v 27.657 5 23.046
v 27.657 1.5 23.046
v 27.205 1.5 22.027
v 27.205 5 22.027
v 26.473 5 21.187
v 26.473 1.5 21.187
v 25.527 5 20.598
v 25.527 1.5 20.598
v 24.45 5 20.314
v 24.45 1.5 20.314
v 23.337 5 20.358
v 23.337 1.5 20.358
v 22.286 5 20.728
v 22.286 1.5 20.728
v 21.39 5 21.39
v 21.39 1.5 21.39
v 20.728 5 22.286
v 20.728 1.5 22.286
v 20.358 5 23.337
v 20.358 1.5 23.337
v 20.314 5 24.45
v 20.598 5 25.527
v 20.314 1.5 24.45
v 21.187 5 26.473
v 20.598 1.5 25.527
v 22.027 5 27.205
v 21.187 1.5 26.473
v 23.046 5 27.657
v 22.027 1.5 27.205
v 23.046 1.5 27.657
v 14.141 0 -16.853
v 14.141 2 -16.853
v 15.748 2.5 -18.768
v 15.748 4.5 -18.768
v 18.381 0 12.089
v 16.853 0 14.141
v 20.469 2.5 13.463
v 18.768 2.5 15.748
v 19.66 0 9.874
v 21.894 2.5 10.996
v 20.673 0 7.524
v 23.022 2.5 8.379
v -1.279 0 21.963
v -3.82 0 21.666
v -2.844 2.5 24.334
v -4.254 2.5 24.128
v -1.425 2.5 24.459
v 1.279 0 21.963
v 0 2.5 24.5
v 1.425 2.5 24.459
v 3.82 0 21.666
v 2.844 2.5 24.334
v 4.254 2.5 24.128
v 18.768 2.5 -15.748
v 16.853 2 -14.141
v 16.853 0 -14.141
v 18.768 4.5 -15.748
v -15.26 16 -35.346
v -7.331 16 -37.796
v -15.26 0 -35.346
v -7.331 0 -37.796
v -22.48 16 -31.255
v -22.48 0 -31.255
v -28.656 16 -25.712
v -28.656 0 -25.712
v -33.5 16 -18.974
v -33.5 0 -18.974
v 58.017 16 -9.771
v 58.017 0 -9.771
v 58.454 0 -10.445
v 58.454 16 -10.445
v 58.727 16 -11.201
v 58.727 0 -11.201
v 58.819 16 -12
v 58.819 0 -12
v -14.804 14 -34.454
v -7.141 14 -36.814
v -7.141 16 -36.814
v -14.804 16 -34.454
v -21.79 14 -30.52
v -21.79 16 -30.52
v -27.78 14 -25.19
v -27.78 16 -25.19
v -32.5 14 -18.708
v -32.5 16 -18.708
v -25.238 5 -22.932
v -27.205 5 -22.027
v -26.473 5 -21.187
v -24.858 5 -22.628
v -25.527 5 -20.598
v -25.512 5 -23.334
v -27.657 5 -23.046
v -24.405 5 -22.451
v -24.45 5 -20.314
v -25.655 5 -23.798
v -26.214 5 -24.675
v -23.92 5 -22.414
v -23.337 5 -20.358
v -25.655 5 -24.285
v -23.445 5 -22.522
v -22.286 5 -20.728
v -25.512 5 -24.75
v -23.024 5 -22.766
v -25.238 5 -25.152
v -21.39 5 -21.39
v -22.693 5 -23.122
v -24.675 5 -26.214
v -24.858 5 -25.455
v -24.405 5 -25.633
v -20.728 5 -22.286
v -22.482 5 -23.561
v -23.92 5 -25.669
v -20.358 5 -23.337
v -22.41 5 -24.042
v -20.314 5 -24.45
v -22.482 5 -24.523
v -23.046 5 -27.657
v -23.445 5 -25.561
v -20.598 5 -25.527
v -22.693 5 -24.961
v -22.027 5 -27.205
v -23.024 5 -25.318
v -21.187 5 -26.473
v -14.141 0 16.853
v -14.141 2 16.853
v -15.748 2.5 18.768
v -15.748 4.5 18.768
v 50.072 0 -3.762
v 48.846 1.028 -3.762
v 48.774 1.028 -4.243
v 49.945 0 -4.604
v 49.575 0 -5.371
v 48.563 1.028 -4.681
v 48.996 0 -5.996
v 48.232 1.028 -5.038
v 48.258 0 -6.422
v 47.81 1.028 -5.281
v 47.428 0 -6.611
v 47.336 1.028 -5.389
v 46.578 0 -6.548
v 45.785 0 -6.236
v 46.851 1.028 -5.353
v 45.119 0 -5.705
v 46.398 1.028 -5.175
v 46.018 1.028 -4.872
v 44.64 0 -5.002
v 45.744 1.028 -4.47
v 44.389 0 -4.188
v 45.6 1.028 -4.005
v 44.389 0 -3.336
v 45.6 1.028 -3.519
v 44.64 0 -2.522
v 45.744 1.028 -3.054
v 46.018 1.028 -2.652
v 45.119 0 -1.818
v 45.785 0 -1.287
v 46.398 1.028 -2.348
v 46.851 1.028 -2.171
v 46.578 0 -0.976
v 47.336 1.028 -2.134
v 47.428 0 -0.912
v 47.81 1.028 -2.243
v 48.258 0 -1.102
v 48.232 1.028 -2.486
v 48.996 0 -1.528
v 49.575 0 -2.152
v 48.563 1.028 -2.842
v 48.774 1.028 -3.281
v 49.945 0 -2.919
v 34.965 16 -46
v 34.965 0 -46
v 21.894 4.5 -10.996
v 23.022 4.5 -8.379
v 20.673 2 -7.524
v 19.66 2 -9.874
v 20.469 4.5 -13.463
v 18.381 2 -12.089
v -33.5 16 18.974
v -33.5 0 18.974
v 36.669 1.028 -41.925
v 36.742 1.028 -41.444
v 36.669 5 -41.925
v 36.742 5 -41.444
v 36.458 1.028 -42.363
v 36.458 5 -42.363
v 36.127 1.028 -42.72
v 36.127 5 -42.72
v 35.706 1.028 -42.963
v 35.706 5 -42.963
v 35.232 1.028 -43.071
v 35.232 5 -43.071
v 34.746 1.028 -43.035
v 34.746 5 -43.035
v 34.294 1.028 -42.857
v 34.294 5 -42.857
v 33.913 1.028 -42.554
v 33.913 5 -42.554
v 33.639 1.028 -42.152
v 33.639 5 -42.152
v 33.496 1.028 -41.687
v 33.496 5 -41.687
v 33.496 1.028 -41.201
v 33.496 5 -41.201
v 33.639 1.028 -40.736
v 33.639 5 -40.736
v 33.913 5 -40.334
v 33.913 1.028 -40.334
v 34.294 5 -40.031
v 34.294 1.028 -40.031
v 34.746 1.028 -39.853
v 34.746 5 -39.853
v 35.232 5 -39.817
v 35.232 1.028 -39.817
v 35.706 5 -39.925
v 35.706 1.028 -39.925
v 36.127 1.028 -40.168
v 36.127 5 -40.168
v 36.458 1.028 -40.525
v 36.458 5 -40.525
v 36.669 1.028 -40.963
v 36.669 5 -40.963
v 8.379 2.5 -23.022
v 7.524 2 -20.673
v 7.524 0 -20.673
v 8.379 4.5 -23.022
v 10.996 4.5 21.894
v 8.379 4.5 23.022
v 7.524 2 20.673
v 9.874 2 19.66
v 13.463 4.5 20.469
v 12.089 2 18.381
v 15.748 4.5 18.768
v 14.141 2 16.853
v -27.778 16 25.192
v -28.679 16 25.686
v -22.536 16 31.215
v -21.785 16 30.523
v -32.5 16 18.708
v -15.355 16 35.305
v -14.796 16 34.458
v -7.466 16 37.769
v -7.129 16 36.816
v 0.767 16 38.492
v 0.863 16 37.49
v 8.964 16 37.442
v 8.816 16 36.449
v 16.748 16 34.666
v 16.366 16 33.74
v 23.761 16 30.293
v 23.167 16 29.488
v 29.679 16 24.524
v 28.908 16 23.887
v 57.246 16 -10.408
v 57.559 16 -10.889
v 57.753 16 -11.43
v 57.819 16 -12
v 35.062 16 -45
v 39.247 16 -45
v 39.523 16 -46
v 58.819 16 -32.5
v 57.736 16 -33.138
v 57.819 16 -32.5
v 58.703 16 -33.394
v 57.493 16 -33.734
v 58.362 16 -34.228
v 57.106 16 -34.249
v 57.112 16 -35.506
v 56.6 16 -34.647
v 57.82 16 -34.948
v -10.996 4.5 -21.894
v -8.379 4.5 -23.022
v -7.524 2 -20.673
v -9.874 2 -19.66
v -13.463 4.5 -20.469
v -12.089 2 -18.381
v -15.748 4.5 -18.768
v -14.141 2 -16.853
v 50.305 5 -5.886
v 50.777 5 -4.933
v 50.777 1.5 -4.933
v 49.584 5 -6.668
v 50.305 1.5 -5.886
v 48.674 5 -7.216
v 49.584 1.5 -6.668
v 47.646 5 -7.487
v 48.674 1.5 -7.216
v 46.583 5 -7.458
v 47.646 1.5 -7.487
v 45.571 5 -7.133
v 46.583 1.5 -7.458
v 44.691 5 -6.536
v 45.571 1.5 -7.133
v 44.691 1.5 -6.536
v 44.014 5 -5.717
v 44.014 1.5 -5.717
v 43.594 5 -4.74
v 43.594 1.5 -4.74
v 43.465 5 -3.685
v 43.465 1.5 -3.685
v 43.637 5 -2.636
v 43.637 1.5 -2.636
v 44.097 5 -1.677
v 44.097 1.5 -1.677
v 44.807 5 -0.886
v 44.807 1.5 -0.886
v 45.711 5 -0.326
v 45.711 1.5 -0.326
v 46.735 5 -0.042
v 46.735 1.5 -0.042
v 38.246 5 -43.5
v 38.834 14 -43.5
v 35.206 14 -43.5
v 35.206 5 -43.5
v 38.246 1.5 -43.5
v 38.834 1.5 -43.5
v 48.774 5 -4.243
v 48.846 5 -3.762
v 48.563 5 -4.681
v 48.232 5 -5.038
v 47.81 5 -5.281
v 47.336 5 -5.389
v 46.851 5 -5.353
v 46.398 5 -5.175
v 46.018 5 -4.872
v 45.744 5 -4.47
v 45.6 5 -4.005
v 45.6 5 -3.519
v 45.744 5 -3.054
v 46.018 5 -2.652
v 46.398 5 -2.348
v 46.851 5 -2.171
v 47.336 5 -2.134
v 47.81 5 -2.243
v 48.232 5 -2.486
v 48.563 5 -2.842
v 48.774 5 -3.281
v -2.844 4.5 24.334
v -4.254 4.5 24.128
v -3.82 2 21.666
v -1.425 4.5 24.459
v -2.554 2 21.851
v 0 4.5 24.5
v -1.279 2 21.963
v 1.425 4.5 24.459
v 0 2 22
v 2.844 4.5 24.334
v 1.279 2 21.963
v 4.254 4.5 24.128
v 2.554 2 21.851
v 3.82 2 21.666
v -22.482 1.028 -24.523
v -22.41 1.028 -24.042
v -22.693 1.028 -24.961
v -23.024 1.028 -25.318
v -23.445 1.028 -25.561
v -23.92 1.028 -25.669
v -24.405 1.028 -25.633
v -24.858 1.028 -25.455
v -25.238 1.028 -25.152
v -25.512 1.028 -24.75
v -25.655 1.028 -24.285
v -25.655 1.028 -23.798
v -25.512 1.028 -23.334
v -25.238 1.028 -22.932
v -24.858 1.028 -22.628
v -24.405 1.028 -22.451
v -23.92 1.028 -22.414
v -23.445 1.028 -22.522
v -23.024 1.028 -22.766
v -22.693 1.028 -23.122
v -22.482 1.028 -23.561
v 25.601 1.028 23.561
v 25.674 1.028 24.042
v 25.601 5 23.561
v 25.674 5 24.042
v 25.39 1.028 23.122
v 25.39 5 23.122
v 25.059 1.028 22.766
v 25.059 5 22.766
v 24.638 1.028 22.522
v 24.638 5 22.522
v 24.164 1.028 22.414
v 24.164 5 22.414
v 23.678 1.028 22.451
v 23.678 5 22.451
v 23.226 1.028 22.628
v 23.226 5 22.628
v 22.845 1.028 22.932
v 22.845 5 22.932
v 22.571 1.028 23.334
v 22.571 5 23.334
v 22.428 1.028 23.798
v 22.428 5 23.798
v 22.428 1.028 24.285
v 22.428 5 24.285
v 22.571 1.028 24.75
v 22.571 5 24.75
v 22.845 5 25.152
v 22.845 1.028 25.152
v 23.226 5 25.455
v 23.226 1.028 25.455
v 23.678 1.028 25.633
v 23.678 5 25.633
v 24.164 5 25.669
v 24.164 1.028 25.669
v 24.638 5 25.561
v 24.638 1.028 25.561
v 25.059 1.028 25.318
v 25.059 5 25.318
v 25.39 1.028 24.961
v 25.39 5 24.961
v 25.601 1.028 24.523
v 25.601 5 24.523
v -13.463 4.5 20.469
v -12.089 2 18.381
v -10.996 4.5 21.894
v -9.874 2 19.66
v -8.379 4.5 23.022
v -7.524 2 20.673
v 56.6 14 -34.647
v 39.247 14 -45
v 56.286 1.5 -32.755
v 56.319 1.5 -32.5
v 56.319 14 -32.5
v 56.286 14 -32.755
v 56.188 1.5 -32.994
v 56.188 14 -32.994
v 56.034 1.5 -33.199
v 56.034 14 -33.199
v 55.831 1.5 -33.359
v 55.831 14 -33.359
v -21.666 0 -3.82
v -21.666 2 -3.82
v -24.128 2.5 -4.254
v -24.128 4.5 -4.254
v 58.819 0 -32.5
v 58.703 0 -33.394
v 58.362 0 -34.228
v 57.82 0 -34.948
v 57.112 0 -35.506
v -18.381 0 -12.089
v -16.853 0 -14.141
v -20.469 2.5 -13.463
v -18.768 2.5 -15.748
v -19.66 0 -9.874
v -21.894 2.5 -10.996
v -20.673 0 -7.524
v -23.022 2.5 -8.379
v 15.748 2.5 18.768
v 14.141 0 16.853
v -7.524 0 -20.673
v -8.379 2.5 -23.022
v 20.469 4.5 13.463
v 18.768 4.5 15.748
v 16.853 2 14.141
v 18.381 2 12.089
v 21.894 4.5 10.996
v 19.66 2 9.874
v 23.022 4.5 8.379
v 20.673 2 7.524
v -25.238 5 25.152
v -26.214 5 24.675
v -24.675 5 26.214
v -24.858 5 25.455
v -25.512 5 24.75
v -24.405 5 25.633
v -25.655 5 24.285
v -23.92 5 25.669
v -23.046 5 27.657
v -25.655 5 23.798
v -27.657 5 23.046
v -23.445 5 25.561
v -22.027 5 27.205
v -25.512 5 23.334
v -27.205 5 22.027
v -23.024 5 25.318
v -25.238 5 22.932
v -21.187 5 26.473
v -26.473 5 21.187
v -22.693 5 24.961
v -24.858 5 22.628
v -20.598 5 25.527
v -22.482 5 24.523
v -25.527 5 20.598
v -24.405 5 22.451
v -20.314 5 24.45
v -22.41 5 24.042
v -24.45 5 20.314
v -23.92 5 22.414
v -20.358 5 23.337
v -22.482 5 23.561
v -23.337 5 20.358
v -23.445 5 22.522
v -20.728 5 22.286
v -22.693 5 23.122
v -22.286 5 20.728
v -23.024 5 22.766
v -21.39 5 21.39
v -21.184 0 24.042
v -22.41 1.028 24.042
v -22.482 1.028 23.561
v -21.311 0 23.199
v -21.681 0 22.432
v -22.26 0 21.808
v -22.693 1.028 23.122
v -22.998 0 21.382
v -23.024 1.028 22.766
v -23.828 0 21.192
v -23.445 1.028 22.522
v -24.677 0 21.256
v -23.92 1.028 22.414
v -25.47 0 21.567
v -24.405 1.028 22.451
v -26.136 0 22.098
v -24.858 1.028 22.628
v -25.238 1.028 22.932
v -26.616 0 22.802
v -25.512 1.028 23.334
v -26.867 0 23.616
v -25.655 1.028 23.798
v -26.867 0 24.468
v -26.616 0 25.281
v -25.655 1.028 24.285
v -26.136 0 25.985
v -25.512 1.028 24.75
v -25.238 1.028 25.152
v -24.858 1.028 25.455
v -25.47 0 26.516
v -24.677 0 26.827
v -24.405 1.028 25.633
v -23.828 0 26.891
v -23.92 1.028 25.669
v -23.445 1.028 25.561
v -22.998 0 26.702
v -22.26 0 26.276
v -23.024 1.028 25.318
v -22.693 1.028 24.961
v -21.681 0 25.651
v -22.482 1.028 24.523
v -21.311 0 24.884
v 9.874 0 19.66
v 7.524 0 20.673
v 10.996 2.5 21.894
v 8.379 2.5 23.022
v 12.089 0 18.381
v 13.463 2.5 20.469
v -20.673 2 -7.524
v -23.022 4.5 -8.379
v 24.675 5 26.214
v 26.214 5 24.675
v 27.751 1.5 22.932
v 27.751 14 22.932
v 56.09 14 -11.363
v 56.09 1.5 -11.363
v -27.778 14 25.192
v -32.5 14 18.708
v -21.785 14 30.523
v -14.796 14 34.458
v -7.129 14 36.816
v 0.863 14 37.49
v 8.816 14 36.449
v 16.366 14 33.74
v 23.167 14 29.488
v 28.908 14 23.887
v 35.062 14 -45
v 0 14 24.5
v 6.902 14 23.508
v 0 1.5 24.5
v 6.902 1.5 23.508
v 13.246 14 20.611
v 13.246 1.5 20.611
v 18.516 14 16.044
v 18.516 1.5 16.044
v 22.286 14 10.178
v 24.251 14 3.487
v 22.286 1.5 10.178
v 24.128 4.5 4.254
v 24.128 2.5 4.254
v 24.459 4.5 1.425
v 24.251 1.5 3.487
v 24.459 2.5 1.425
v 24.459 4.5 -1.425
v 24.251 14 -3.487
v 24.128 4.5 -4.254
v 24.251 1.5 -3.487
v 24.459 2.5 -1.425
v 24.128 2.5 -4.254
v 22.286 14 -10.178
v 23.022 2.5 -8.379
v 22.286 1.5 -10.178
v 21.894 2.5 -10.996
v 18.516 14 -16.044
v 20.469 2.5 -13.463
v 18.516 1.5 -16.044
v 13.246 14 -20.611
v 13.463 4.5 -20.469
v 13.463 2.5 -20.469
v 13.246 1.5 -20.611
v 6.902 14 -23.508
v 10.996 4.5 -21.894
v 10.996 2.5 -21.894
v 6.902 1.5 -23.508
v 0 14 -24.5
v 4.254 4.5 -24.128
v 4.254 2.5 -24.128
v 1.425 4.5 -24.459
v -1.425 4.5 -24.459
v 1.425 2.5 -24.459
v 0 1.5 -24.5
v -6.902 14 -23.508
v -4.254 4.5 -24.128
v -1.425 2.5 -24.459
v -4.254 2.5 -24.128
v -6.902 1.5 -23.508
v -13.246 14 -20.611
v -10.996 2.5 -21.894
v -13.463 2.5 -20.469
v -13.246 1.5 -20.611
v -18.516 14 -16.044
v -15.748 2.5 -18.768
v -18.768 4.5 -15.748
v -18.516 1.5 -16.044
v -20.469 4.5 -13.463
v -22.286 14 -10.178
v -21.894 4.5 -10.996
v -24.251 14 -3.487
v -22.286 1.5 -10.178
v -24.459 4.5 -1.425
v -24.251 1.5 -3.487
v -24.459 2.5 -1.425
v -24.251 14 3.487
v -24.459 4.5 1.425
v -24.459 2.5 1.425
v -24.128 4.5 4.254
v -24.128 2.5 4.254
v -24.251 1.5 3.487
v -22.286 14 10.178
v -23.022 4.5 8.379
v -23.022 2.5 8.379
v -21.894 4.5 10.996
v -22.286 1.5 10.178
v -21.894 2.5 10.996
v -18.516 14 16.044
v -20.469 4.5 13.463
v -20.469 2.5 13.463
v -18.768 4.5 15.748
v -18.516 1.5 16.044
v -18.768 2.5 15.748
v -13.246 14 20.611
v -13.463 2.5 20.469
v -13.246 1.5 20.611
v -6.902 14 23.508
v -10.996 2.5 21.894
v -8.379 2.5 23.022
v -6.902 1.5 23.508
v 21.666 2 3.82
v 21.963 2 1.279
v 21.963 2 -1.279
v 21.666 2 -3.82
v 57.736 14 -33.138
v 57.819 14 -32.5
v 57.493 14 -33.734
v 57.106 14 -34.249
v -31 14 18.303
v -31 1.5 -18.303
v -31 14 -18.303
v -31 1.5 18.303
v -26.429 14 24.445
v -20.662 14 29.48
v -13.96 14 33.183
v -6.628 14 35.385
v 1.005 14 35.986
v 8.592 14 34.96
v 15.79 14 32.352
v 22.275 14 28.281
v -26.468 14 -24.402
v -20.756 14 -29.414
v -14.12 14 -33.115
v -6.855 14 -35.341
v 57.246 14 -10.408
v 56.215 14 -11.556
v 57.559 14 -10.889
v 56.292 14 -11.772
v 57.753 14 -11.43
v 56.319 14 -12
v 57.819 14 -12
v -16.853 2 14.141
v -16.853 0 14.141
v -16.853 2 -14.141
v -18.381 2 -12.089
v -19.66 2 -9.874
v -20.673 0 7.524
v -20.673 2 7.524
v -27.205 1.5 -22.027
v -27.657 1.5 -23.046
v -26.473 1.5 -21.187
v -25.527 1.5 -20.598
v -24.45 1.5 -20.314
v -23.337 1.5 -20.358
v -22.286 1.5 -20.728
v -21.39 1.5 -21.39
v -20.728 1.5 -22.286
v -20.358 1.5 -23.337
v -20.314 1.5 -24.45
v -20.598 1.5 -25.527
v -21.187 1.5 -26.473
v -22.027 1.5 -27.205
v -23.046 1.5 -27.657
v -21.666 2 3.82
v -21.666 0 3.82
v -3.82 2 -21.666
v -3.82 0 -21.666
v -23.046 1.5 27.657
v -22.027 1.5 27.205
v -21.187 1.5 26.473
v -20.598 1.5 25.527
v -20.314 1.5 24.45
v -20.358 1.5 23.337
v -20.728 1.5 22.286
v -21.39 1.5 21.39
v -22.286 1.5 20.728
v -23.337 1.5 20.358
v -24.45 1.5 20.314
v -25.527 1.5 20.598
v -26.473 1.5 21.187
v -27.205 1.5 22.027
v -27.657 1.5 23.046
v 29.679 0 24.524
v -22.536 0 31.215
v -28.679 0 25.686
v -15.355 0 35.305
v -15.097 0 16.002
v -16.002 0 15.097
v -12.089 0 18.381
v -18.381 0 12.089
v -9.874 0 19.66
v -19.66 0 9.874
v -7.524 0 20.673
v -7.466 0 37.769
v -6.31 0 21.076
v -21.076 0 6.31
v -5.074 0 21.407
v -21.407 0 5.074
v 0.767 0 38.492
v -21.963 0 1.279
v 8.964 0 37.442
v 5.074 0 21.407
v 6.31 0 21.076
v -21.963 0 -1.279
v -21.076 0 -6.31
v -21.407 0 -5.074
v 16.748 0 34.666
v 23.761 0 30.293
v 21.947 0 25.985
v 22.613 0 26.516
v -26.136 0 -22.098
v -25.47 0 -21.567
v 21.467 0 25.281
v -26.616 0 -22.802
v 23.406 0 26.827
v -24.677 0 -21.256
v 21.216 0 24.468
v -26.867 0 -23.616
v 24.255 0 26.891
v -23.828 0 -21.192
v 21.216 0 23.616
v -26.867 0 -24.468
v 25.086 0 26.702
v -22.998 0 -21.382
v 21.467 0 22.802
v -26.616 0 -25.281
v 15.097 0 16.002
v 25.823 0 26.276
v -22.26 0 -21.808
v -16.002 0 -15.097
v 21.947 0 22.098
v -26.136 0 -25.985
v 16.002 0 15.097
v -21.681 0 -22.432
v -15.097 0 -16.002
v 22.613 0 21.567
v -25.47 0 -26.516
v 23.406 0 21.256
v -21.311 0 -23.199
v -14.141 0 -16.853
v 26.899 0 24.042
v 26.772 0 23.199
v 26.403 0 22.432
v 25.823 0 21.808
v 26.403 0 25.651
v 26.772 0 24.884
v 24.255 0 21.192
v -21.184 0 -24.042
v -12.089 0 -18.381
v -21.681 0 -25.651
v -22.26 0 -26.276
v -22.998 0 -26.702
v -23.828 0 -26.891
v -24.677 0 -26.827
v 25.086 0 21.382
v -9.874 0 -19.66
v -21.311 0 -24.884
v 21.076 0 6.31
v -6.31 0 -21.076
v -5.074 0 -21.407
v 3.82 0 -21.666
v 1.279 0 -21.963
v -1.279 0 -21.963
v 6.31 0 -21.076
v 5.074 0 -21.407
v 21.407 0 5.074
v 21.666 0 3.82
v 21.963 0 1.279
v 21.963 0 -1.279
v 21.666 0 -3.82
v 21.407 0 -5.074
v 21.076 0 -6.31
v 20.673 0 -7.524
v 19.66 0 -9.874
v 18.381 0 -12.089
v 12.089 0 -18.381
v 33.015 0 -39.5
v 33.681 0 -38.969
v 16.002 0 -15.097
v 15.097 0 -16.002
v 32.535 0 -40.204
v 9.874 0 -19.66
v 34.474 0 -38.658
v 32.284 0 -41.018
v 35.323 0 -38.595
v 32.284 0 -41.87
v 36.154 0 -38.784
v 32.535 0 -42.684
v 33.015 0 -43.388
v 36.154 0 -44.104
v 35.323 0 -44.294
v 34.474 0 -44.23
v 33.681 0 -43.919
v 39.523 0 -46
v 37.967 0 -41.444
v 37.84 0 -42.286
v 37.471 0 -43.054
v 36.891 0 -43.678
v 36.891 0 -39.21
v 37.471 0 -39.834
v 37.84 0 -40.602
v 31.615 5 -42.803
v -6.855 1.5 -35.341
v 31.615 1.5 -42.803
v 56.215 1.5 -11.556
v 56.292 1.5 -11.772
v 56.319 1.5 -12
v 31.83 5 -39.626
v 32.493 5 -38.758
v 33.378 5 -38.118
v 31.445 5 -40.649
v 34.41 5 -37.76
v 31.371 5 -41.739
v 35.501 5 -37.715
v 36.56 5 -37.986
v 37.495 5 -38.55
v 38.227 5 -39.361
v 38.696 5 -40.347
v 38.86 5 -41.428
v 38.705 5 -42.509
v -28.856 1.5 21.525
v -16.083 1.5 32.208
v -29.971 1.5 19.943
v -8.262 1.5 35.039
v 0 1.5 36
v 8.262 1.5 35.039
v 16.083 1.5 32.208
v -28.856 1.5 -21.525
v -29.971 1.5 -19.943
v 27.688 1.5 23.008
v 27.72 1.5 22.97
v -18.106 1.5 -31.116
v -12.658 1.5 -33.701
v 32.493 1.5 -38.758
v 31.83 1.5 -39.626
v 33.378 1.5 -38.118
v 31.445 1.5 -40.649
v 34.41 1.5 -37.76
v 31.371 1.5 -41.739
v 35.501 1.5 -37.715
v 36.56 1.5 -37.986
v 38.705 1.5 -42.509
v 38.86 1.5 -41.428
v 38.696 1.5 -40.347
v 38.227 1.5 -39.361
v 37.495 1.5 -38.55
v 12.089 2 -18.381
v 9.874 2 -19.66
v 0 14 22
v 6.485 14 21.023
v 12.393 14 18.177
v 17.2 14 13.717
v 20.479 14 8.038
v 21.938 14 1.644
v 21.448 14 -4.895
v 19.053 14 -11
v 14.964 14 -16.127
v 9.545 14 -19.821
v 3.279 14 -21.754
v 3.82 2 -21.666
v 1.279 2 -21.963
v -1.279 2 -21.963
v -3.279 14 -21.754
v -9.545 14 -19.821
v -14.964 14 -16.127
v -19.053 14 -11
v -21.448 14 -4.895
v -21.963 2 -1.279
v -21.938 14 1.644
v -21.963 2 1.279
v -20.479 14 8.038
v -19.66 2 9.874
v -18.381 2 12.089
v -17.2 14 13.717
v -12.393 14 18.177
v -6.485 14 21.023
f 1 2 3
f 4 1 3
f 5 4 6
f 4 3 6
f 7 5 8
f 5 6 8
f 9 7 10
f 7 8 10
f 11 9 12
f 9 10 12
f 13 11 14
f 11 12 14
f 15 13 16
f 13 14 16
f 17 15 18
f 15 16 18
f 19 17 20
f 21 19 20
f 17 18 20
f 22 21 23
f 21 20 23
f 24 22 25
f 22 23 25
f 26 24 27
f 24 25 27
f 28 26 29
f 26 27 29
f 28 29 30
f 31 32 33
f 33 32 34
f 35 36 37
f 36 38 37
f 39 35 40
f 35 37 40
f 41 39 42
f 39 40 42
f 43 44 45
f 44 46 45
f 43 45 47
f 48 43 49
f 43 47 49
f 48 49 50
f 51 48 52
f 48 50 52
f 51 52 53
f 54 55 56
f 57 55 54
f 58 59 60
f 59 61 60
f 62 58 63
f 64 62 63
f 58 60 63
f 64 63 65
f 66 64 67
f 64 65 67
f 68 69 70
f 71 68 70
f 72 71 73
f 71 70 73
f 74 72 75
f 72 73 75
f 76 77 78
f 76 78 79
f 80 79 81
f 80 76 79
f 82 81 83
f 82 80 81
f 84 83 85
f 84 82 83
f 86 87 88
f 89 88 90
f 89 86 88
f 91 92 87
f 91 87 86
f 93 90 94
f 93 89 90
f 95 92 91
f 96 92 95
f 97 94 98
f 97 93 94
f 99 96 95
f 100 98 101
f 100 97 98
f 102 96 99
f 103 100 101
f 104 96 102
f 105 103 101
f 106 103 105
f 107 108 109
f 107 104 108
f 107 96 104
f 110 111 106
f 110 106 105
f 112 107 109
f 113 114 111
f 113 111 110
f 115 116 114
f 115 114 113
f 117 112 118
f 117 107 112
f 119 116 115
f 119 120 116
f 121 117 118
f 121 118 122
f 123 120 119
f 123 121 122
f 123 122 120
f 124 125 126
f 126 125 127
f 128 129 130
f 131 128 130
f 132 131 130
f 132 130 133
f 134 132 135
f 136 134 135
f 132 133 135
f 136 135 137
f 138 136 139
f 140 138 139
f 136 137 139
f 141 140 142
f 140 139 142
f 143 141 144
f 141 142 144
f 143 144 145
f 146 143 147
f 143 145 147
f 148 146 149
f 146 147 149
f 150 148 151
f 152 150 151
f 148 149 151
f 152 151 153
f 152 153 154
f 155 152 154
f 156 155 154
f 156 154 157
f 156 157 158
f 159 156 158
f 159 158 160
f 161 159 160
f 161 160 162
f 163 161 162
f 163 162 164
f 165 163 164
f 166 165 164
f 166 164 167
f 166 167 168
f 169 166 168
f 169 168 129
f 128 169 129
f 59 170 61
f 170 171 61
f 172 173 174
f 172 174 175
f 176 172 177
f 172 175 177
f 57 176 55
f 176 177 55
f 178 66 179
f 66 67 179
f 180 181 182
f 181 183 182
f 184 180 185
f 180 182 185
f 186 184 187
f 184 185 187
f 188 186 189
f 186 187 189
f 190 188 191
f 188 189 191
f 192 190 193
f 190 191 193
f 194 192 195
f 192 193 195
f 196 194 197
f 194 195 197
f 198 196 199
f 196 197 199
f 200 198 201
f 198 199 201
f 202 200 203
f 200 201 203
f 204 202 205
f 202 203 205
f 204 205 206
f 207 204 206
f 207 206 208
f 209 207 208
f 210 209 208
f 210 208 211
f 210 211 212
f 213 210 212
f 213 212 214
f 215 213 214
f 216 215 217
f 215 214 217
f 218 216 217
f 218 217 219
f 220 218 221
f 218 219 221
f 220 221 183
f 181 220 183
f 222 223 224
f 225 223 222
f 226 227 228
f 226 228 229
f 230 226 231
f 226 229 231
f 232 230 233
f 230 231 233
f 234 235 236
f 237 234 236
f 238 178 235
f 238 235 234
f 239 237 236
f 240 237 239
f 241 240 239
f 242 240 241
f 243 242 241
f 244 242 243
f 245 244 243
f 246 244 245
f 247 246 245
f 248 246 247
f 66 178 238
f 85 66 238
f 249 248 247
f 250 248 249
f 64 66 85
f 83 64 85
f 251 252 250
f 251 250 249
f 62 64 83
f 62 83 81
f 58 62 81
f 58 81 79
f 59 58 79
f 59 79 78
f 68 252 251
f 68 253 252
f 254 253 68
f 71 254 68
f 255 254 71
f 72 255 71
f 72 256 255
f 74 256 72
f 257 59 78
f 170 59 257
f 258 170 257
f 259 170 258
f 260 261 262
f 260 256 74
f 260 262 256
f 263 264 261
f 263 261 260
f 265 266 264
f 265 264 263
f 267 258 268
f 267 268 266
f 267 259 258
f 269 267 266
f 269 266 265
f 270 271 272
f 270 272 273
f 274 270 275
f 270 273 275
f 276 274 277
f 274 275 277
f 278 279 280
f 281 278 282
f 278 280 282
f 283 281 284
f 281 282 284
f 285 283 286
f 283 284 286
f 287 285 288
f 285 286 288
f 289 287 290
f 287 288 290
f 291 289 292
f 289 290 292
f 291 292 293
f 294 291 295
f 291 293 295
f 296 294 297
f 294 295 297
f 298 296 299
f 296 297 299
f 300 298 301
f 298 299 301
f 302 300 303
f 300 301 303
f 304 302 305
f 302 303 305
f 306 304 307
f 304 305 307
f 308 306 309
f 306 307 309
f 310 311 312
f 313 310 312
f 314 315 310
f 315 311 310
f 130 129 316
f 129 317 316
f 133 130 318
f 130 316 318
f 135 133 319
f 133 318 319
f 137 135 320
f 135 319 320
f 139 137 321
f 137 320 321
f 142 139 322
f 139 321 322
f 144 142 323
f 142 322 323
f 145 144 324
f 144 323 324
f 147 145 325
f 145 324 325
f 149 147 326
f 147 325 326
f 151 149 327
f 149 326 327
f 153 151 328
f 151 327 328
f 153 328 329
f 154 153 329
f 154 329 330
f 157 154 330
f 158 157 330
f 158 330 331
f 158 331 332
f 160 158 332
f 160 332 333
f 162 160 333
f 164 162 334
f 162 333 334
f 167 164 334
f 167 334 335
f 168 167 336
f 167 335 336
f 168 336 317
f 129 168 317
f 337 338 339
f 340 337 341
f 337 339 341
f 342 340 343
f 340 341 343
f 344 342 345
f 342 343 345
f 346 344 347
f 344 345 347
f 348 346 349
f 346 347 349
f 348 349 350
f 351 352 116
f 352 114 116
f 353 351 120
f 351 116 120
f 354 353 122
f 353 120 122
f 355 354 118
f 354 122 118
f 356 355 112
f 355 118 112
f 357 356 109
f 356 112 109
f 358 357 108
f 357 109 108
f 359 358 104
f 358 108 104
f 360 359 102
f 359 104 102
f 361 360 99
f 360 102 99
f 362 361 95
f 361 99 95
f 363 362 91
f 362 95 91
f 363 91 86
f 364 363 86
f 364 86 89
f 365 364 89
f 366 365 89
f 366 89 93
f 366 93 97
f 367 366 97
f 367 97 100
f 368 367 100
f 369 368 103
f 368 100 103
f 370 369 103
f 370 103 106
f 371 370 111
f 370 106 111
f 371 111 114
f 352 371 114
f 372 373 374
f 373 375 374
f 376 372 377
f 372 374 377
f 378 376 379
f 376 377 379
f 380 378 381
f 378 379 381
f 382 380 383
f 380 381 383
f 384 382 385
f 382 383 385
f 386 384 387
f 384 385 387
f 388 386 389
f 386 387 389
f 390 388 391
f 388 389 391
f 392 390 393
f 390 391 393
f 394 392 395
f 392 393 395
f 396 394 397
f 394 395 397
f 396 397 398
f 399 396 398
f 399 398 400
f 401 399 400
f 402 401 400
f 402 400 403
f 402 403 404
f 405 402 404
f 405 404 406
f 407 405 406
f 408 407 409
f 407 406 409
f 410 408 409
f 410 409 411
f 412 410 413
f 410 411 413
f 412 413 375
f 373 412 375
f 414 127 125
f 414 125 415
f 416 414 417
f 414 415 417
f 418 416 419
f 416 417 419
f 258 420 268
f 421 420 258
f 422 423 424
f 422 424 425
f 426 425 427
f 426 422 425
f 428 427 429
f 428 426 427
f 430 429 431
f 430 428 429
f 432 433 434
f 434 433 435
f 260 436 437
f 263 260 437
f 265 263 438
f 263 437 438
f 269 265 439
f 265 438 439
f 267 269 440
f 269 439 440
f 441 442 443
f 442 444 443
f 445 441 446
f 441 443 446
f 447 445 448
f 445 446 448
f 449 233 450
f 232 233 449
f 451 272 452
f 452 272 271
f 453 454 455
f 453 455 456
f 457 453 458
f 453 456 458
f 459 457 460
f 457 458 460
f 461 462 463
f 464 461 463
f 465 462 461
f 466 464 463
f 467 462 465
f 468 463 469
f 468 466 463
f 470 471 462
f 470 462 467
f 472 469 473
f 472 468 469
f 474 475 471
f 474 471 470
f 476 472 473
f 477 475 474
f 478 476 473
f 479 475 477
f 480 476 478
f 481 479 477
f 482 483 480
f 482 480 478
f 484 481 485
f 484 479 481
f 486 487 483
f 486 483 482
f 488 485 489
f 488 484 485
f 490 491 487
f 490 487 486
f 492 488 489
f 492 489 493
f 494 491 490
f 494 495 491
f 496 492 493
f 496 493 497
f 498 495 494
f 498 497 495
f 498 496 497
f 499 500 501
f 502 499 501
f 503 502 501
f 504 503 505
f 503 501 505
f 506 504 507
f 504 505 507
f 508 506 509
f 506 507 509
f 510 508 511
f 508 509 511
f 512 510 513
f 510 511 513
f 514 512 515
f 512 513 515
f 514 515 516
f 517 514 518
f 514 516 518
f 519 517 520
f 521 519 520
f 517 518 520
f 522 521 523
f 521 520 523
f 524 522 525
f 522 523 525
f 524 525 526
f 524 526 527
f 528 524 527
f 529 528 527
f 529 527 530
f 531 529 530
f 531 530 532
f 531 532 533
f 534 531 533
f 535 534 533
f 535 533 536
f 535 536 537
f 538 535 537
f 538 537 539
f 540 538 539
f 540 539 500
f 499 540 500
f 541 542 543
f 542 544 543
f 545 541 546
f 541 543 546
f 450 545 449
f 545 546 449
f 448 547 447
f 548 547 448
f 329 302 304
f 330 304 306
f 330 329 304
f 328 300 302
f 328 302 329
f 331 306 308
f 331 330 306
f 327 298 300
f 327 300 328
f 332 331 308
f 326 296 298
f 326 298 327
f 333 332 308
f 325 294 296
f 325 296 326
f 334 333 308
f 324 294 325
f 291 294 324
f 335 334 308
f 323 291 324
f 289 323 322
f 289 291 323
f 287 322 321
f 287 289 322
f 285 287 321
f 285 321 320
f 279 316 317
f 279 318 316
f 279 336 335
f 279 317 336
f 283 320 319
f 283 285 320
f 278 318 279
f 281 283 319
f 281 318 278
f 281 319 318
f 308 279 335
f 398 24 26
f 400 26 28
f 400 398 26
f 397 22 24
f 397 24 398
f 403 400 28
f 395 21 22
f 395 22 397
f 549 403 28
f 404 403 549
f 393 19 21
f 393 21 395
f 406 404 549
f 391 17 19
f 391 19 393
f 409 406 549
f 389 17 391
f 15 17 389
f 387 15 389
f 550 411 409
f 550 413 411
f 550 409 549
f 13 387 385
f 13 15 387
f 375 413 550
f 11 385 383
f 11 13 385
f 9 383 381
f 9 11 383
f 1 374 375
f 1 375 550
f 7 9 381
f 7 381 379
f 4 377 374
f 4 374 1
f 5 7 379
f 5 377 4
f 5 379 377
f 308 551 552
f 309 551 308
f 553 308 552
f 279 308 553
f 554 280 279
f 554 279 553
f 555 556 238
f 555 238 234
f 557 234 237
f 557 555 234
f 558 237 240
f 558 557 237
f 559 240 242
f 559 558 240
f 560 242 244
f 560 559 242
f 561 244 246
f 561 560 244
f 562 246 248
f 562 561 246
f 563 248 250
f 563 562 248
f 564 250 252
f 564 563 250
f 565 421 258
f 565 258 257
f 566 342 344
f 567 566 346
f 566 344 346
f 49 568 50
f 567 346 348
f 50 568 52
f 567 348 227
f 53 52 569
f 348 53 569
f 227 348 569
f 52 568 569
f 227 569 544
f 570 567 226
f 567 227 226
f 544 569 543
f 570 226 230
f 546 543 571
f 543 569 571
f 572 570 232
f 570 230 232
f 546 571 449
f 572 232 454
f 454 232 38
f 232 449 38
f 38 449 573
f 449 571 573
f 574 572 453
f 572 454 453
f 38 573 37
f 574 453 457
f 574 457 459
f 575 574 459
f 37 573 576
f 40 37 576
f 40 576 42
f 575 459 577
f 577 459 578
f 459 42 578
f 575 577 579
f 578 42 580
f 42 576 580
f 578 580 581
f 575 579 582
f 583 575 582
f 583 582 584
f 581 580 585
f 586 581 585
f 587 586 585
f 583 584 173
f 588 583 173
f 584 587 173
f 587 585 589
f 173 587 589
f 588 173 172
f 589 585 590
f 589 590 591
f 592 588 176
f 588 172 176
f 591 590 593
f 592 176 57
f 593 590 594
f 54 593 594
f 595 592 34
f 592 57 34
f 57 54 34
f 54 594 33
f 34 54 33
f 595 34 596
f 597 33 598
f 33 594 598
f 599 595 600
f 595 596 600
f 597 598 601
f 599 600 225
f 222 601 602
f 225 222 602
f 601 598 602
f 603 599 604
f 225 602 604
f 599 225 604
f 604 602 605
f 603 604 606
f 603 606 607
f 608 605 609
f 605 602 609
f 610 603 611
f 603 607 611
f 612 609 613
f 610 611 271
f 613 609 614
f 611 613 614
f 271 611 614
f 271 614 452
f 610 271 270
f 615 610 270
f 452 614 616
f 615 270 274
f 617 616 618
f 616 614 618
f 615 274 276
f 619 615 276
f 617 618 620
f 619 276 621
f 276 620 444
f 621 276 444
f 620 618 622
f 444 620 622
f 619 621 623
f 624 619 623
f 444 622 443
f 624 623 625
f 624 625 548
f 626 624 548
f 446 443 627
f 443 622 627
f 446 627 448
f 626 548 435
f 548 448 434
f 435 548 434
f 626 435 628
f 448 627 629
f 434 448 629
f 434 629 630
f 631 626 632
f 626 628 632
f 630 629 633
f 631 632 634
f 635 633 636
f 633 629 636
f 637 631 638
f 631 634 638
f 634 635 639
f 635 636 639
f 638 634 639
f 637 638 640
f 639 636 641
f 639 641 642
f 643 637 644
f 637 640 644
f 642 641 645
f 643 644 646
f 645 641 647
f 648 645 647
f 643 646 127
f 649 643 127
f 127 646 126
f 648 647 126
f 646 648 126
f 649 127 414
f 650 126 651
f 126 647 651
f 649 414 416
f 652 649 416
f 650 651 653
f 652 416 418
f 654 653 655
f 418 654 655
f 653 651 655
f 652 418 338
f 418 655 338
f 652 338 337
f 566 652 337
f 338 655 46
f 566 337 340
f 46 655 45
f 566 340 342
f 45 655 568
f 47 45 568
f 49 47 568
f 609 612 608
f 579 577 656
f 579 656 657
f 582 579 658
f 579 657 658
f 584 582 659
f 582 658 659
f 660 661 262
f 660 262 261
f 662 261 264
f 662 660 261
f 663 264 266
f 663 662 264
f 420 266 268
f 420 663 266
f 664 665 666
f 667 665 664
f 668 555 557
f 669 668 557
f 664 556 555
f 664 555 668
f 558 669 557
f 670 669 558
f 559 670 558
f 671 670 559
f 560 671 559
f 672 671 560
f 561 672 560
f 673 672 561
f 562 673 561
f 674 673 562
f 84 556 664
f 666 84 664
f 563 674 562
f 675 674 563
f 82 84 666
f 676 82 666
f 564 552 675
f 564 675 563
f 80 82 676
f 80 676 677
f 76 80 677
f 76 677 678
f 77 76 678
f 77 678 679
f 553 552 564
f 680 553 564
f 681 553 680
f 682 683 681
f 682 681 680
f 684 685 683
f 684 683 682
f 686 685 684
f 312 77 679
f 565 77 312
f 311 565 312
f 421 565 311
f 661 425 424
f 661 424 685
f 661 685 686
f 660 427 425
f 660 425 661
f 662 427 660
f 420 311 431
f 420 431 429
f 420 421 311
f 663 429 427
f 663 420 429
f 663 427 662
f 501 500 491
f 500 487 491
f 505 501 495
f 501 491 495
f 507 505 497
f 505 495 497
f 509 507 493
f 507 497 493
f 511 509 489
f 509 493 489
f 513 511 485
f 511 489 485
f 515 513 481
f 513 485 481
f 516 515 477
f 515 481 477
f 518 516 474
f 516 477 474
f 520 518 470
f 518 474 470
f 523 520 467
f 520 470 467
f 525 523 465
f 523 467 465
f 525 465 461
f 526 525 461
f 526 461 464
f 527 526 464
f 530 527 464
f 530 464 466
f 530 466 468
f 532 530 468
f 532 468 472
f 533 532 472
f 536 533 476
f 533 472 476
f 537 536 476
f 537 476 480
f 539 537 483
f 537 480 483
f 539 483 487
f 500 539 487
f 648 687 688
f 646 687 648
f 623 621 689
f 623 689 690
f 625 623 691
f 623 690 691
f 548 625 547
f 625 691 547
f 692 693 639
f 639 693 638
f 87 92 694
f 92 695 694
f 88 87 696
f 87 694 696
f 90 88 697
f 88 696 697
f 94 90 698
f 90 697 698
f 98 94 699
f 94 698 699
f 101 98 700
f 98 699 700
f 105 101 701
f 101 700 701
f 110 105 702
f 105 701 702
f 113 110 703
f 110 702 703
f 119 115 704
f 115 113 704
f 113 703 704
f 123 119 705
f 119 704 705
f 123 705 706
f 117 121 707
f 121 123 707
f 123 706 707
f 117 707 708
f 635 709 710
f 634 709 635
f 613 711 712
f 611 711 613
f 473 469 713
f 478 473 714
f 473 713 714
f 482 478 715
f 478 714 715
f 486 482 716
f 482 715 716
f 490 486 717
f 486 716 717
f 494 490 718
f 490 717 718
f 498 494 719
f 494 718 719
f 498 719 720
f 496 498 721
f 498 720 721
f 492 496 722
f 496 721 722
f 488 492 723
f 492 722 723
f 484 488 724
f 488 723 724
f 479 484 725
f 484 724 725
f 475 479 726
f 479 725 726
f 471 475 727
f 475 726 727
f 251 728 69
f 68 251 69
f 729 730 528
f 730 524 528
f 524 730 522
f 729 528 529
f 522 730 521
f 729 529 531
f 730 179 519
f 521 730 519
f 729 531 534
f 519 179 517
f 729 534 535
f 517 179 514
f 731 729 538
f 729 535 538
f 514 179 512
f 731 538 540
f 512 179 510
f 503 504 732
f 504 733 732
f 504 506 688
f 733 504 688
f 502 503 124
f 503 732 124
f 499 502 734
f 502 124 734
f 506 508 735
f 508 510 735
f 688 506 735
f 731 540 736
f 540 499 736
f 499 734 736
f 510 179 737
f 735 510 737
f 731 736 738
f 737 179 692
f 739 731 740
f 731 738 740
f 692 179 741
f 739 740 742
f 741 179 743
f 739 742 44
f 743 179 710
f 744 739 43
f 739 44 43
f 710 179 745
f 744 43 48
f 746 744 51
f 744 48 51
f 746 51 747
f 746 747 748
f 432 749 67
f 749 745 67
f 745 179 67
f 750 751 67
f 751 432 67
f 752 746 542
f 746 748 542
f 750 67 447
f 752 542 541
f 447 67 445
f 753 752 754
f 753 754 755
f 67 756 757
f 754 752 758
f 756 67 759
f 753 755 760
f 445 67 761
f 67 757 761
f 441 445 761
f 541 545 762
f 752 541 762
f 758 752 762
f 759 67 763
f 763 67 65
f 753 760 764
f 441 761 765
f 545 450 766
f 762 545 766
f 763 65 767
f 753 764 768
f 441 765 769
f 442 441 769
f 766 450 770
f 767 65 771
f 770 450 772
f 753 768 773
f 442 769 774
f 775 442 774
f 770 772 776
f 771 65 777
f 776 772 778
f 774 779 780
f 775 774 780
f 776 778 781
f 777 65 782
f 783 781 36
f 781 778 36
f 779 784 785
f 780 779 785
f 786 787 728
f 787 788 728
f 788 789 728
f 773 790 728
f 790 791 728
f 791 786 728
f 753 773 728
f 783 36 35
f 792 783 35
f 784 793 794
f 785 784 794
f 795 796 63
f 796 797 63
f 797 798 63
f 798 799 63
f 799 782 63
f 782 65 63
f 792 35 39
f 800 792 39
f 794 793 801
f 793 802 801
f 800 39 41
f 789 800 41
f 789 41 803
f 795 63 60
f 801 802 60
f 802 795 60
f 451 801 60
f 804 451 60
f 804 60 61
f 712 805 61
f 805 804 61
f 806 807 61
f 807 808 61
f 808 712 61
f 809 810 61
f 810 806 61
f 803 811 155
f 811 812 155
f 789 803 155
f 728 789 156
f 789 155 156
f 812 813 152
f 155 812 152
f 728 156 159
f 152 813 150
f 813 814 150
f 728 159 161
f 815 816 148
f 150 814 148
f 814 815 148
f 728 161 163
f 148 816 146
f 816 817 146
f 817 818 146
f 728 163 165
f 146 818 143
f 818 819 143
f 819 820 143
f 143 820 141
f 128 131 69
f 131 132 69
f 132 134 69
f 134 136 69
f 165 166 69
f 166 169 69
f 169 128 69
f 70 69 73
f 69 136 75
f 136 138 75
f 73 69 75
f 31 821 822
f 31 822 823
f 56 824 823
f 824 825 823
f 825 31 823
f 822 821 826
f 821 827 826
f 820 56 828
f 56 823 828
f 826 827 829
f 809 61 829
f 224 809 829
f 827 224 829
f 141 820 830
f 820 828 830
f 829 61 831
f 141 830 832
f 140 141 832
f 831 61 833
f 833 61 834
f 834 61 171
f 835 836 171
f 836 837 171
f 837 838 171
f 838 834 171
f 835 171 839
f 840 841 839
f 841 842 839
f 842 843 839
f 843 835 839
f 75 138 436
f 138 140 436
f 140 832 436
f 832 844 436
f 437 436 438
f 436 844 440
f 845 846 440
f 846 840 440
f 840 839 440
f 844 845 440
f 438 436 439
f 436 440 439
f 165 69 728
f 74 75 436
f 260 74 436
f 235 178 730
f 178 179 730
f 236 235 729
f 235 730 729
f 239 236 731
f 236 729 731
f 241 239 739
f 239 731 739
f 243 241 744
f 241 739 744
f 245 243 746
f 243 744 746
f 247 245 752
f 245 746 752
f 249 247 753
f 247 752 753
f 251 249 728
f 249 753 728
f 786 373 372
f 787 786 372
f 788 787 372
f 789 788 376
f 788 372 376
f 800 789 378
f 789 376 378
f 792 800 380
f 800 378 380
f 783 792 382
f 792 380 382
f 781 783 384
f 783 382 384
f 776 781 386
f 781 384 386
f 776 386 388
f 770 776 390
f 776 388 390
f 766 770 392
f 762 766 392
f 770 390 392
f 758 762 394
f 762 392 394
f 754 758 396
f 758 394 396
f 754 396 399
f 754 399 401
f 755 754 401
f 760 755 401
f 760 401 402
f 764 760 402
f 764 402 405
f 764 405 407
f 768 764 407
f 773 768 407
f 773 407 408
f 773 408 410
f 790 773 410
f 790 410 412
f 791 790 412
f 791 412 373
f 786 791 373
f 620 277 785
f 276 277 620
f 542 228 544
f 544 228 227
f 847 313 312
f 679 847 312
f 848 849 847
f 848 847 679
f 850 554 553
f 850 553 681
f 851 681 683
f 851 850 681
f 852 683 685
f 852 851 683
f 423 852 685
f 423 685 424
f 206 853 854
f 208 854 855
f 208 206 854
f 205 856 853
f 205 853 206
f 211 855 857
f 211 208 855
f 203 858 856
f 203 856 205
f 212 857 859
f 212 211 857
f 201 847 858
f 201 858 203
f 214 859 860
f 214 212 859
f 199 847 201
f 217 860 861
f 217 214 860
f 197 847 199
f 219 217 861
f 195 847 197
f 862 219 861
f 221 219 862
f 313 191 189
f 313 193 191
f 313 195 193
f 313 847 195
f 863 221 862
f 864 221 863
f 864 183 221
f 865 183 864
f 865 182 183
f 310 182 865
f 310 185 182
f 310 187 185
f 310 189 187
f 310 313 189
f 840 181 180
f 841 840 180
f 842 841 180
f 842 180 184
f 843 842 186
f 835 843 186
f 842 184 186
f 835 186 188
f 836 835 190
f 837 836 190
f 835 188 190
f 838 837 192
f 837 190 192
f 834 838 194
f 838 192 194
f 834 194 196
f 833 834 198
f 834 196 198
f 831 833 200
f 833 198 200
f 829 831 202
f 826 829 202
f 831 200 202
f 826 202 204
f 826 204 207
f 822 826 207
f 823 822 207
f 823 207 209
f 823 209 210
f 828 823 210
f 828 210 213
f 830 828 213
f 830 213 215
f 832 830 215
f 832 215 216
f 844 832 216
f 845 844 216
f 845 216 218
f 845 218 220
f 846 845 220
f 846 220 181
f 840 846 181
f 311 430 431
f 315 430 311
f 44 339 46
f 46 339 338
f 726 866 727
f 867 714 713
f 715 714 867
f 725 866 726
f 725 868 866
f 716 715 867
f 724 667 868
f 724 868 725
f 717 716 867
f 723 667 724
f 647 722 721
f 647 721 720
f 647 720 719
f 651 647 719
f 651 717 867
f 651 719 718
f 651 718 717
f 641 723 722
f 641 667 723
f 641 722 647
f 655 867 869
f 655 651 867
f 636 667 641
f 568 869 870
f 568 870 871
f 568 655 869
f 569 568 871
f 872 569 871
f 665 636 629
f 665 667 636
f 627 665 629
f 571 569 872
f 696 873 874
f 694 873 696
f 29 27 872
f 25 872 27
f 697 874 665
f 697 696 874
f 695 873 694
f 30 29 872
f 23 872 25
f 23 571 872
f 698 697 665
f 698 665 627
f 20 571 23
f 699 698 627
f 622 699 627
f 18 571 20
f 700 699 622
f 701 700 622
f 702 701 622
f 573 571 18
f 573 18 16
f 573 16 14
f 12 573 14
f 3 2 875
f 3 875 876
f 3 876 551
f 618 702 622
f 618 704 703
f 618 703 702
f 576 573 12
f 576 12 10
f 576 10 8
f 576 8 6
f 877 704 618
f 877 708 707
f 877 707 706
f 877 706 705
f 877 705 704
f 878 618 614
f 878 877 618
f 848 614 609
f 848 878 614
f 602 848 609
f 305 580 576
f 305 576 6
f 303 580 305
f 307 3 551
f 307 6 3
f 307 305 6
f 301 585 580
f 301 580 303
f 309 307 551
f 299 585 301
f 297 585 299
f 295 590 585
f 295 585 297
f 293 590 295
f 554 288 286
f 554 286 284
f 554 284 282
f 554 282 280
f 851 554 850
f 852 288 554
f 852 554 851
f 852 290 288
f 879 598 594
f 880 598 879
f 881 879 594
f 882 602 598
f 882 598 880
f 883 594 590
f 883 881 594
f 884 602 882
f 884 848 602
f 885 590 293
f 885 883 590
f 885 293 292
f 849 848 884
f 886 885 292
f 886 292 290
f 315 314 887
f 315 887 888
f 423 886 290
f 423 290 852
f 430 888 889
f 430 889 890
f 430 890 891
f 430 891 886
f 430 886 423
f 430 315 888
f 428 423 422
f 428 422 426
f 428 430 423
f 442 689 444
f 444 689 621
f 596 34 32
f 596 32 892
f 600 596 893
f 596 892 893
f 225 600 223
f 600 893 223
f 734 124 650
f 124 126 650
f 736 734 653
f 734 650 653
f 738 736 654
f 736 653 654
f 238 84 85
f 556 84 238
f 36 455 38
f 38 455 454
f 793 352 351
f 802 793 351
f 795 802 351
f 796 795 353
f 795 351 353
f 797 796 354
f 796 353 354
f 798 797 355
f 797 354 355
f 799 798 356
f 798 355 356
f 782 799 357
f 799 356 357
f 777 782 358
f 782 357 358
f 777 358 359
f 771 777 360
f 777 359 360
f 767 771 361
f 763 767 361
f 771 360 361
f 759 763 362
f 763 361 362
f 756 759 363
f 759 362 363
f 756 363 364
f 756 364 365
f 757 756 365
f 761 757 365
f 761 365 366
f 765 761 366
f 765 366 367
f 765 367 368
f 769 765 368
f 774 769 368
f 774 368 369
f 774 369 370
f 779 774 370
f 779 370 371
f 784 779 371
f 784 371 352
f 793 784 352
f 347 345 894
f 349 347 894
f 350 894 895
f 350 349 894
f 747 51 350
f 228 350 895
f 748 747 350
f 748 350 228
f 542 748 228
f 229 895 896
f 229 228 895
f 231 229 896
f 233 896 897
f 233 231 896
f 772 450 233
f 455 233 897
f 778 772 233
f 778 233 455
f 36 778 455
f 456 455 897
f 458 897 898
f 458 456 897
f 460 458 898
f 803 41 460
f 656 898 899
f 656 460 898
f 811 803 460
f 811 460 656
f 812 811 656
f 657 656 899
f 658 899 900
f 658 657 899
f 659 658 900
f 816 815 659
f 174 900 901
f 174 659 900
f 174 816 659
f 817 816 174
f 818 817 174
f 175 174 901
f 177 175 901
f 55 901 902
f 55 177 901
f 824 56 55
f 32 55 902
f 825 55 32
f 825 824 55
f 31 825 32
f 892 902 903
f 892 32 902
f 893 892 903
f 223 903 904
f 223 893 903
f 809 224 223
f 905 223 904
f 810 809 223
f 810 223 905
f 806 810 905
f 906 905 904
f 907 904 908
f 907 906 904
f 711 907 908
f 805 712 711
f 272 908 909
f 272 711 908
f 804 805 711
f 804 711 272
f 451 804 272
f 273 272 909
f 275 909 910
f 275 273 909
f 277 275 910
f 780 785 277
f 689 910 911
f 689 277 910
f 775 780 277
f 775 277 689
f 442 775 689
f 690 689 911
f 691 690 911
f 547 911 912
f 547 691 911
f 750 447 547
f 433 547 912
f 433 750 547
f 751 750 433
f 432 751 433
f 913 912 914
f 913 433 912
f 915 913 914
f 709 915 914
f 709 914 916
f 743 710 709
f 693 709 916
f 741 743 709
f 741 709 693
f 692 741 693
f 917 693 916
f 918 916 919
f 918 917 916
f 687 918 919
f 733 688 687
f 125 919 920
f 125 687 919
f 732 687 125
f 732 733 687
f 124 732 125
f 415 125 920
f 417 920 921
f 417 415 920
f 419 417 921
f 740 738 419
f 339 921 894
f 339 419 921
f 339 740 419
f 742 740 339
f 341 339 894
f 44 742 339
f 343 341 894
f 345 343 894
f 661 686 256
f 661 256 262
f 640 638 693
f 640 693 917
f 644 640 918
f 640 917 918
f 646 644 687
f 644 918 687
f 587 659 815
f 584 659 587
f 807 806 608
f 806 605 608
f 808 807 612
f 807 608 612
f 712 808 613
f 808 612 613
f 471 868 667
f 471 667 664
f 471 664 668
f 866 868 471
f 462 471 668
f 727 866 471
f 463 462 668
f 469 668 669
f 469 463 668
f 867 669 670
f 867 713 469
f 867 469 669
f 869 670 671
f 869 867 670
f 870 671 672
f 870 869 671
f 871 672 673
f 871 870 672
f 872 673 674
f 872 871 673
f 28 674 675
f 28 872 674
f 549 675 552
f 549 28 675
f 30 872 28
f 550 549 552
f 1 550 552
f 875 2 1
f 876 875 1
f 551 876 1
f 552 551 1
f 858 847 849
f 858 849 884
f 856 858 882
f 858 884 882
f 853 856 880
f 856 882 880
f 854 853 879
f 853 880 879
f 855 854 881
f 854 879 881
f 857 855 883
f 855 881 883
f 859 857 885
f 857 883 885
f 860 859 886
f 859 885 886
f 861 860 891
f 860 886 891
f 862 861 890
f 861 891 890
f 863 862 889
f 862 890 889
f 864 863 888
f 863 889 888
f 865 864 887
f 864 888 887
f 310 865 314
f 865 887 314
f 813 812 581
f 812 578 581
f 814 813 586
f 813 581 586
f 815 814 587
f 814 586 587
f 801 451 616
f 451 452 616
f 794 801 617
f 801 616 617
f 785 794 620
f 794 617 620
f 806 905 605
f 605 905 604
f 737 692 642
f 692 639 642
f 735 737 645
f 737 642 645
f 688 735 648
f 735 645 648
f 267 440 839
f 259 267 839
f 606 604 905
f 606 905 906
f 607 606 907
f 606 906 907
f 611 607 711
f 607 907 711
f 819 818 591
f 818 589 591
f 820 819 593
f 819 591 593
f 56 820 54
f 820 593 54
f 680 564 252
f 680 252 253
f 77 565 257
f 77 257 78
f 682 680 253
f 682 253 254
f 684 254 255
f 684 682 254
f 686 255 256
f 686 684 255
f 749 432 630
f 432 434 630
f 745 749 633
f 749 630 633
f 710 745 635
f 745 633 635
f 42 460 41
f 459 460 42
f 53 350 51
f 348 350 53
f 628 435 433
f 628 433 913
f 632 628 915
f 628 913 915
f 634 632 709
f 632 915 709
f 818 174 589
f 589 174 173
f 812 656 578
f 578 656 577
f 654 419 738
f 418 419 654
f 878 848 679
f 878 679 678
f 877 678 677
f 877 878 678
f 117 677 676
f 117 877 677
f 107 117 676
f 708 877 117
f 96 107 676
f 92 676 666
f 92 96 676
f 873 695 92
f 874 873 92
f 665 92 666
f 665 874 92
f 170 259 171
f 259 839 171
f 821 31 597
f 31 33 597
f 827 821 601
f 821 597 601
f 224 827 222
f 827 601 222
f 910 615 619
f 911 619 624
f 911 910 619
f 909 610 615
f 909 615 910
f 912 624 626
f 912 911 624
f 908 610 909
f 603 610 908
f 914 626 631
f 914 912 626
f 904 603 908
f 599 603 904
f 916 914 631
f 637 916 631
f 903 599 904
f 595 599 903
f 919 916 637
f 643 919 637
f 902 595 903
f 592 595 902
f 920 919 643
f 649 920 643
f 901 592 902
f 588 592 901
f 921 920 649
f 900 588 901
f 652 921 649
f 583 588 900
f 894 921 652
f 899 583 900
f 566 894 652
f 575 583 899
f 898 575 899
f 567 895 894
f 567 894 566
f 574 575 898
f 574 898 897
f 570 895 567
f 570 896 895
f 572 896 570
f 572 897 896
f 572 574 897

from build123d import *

# Parameters (mm, degrees)
SKETCH3_R                                         = 22
BOSS_EXTRUDE1_DEPTH                               = 1.5
BOSS_EXTRUDE2_DEPTH                               = 12.5
SKETCH5_R                                         = 24.5
SKETCH5_R_2                                       = 22
BOSS_EXTRUDE3_DEPTH                               = 12.5
BOSS_EXTRUDE5_DEPTH                               = 2
CUT_REVOLVE1_ANGLE                                = 20
CIRPATTERN1_COUNT                                 = 12
SKETCH12_R                                        = 3.75
BOSS_EXTRUDE6_DEPTH                               = 5
CSK_FOR_4_FLAT_HEAD_MACHINE_SCREW_100_D           = 3.2639
CSK_FOR_4_FLAT_HEAD_MACHINE_SCREW_100_CSINK_D     = 5.715
CSK_FOR_4_FLAT_HEAD_MACHINE_SCREW_100_CSINK_ANGLE = 100


# Read off the part's stored shape, not the designer's step: Cut-Revolve1
with BuildPart() as part:
    # Sketch3 → Boss-Extrude1 (new body)
    with BuildSketch(Plane(origin=(0, 0, 0), x_dir=(1, 0, 0), z_dir=(0, 1, 0))):
        with BuildLine():
            Line((39.523027355, 46), (34.965412665, 46))
            Line((34.965412665, 46), (-7.331355166, 37.795518669))
            ThreePointArc((-7.331355166, 37.795518669), (-22.480334206, 31.255152759), (-33.5, 18.973665961))
            Line((-33.5, 18.973665961), (-33.5, -18.973665961))
            ThreePointArc((-33.5, -18.973665961), (-3.369315914, -38.35228429), (29.67865128, -24.524022064))
            Line((29.67865128, -24.524022064), (58.016889207, 9.770543449))
            ThreePointArc((58.016889207, 9.770543449), (58.612248226, 10.815349677), (58.81883, 12))
            Line((58.81883, 12), (58.81883, 32.5))
            ThreePointArc((58.81883, 32.5), (58.362392683, 34.228214743), (57.112129316, 35.505674228))
            Line((57.112129316, 35.505674228), (39.523027355, 46))
        make_face()
        with Locations(Location((0, 0, 0), (0, 0, 270))):
            Circle(SKETCH3_R, mode=Mode.SUBTRACT)
    extrude(amount=BOSS_EXTRUDE1_DEPTH)

    # Sketch4 → Boss-Extrude2 (add)
    with BuildSketch(Plane(origin=(0, 1.5, 0), x_dir=(1, 0, 0), z_dir=(0, 1, 0))):
        with BuildLine():
            Line((57.112129316, 35.505674228), (39.523027355, 46))
            Line((39.523027355, 46), (34.965412665, 46))
            Line((34.965412665, 46), (-7.331355166, 37.795518669))
            ThreePointArc((-7.331355166, 37.795518669), (-22.480334206, 31.255152759), (-33.5, 18.973665961))
            Line((-33.5, 18.973665961), (-33.5, -18.973665961))
            ThreePointArc((-33.5, -18.973665961), (-3.369315914, -38.35228429), (29.67865128, -24.524022064))
            Line((29.67865128, -24.524022064), (58.016889207, 9.770543449))
            ThreePointArc((58.016889207, 9.770543449), (58.612248226, 10.815349677), (58.81883, 12))
            Line((58.81883, 12), (58.81883, 32.5))
            ThreePointArc((58.81883, 32.5), (58.362392683, 34.228214743), (57.112129316, 35.505674228))
        make_face()
        with BuildLine():
            Line((55.831201233, 33.358764065), (38.83389843, 43.5))
            Line((38.83389843, 43.5), (35.205641557, 43.5))
            Line((35.205641557, 43.5), (-6.855293142, 35.34126421))
            ThreePointArc((-6.855293142, 35.34126421), (-20.756477834, 29.413748961), (-31, 18.303005218))
            Line((-31, 18.303005218), (-31, -18.303005218))
            ThreePointArc((-31, -18.303005218), (-2.827385178, -35.888798992), (27.751466132, -22.931553099))
            Line((27.751466132, -22.931553099), (56.089704059, 11.363012414))
            ThreePointArc((56.089704059, 11.363012414), (56.259806636, 11.661528479), (56.31883, 12))
            Line((56.31883, 12), (56.31883, 32.5))
            ThreePointArc((56.31883, 32.5), (56.188419338, 32.993775641), (55.831201233, 33.358764065))
        make_face(mode=Mode.SUBTRACT)
    extrude(amount=BOSS_EXTRUDE2_DEPTH)

    # Sketch5 → Boss-Extrude3 (add)
    with BuildSketch(Plane(origin=(0, 1.5, 0), x_dir=(1, 0, 0), z_dir=(0, 1, 0))):
        with Locations(Location((0, 0, 0), (0, 0, 270))):
            Circle(SKETCH5_R)
        with Locations(Location((0, 0, 0), (0, 0, 270))):
            Circle(SKETCH5_R_2, mode=Mode.SUBTRACT)
    extrude(amount=BOSS_EXTRUDE3_DEPTH)

    # Sketch8 → Boss-Extrude5 (add)
    with BuildSketch(Plane(origin=(0, 14, 0), x_dir=(1, 0, 0), z_dir=(0, 1, 0))):
        with BuildLine():
            Line((57.112129316, 35.505674228), (39.523027355, 46))
            Line((39.523027355, 46), (34.965412665, 46))
            Line((34.965412665, 46), (-7.331355166, 37.795518669))
            ThreePointArc((-7.331355166, 37.795518669), (-22.480334206, 31.255152759), (-33.5, 18.973665961))
            Line((-33.5, 18.973665961), (-33.5, -18.973665961))
            ThreePointArc((-33.5, -18.973665961), (-3.369315914, -38.35228429), (29.67865128, -24.524022064))
            Line((29.67865128, -24.524022064), (58.016889207, 9.770543449))
            ThreePointArc((58.016889207, 9.770543449), (58.612248226, 10.815349677), (58.81883, 12))
            Line((58.81883, 12), (58.81883, 32.5))
            ThreePointArc((58.81883, 32.5), (58.362392683, 34.228214743), (57.112129316, 35.505674228))
        make_face()
        with BuildLine():
            Line((35.061504222, 45), (-7.140930356, 36.813816885))
            ThreePointArc((-7.140930356, 36.813816885), (-21.78998379, 30.519610194), (-32.5, 18.708286934))
            Line((-32.5, 18.708286934), (-32.5, -18.708286934))
            ThreePointArc((-32.5, -18.708286934), (-3.151328713, -37.367353764), (28.907777221, -23.887034478))
            Line((28.907777221, -23.887034478), (57.246015148, 10.407531035))
            ThreePointArc((57.246015148, 10.407531035), (57.67127159, 11.153821198), (57.81883, 12))
            Line((57.81883, 12), (57.81883, 32.5))
            ThreePointArc((57.81883, 32.5), (57.492803345, 33.734439102), (56.599758083, 34.646910163))
            Line((56.599758083, 34.646910163), (39.247375785, 45))
            Line((39.247375785, 45), (35.061504222, 45))
        make_face(mode=Mode.SUBTRACT)
    extrude(amount=BOSS_EXTRUDE5_DEPTH)

    # Cut-Revolve1 outline → Cut-Revolve1 (revolve, cut)
    with BuildSketch(Plane(origin=(0, 0, 0), x_dir=(0.984807753012208, 0, 0.17364817766693078), z_dir=(-0.17364817766693078, 0, 0.984807753012208))):
        Polygon((22, 2), (22, 0), (24.5, 2.5), (24.5, 4.5), align=None)
    cut_revolve1 = revolve(axis=Axis((0, 0, 0), (0, 1, 0)), revolution_arc=CUT_REVOLVE1_ANGLE, mode=Mode.SUBTRACT)

    # CirPattern1: Cut-Revolve1 ×12 about axis
    cirpattern1_axis = Axis((0, 0, 0), (0, 1, 0))
    for i in range(1, CIRPATTERN1_COUNT):
        add(cut_revolve1.rotate(cirpattern1_axis, i * 360 / CIRPATTERN1_COUNT), mode=Mode.SUBTRACT)

    # Sketch12 → Boss-Extrude6 (add)
    with BuildSketch(Plane(origin=(0, 0, 0), x_dir=(1, 0, 0), z_dir=(0, 1, 0))):
        with Locations((-24.04163056, 24.04163056)):
            Circle(SKETCH12_R)
        with Locations((-24.04163056, -24.04163056)):
            Circle(SKETCH12_R)
        with Locations((24.04163056, -24.04163056)):
            Circle(SKETCH12_R)
        with Locations((47.21419, 3.761759805)):
            Circle(SKETCH12_R)
        with Locations((35.10955, 41.444082154)):
            Circle(SKETCH12_R)
    extrude(amount=BOSS_EXTRUDE6_DEPTH)

    # CSK for #4 Flat Head Machine Screw (100)1 (through all)
    with Locations(Plane(origin=(0, 0, 0), x_dir=(-1, 0, 0), z_dir=(0, -1, 0))):
        with Locations((-35.10955, 41.444082154), (-47.21419, 3.761759805), (-24.04163056, -24.04163056), (24.04163056, -24.04163056), (24.04163056, 24.04163056)):
            CounterSinkHole(CSK_FOR_4_FLAT_HEAD_MACHINE_SCREW_100_D / 2, CSK_FOR_4_FLAT_HEAD_MACHINE_SCREW_100_CSINK_D / 2, counter_sink_angle=CSK_FOR_4_FLAT_HEAD_MACHINE_SCREW_100_CSINK_ANGLE)


solid = part.part
